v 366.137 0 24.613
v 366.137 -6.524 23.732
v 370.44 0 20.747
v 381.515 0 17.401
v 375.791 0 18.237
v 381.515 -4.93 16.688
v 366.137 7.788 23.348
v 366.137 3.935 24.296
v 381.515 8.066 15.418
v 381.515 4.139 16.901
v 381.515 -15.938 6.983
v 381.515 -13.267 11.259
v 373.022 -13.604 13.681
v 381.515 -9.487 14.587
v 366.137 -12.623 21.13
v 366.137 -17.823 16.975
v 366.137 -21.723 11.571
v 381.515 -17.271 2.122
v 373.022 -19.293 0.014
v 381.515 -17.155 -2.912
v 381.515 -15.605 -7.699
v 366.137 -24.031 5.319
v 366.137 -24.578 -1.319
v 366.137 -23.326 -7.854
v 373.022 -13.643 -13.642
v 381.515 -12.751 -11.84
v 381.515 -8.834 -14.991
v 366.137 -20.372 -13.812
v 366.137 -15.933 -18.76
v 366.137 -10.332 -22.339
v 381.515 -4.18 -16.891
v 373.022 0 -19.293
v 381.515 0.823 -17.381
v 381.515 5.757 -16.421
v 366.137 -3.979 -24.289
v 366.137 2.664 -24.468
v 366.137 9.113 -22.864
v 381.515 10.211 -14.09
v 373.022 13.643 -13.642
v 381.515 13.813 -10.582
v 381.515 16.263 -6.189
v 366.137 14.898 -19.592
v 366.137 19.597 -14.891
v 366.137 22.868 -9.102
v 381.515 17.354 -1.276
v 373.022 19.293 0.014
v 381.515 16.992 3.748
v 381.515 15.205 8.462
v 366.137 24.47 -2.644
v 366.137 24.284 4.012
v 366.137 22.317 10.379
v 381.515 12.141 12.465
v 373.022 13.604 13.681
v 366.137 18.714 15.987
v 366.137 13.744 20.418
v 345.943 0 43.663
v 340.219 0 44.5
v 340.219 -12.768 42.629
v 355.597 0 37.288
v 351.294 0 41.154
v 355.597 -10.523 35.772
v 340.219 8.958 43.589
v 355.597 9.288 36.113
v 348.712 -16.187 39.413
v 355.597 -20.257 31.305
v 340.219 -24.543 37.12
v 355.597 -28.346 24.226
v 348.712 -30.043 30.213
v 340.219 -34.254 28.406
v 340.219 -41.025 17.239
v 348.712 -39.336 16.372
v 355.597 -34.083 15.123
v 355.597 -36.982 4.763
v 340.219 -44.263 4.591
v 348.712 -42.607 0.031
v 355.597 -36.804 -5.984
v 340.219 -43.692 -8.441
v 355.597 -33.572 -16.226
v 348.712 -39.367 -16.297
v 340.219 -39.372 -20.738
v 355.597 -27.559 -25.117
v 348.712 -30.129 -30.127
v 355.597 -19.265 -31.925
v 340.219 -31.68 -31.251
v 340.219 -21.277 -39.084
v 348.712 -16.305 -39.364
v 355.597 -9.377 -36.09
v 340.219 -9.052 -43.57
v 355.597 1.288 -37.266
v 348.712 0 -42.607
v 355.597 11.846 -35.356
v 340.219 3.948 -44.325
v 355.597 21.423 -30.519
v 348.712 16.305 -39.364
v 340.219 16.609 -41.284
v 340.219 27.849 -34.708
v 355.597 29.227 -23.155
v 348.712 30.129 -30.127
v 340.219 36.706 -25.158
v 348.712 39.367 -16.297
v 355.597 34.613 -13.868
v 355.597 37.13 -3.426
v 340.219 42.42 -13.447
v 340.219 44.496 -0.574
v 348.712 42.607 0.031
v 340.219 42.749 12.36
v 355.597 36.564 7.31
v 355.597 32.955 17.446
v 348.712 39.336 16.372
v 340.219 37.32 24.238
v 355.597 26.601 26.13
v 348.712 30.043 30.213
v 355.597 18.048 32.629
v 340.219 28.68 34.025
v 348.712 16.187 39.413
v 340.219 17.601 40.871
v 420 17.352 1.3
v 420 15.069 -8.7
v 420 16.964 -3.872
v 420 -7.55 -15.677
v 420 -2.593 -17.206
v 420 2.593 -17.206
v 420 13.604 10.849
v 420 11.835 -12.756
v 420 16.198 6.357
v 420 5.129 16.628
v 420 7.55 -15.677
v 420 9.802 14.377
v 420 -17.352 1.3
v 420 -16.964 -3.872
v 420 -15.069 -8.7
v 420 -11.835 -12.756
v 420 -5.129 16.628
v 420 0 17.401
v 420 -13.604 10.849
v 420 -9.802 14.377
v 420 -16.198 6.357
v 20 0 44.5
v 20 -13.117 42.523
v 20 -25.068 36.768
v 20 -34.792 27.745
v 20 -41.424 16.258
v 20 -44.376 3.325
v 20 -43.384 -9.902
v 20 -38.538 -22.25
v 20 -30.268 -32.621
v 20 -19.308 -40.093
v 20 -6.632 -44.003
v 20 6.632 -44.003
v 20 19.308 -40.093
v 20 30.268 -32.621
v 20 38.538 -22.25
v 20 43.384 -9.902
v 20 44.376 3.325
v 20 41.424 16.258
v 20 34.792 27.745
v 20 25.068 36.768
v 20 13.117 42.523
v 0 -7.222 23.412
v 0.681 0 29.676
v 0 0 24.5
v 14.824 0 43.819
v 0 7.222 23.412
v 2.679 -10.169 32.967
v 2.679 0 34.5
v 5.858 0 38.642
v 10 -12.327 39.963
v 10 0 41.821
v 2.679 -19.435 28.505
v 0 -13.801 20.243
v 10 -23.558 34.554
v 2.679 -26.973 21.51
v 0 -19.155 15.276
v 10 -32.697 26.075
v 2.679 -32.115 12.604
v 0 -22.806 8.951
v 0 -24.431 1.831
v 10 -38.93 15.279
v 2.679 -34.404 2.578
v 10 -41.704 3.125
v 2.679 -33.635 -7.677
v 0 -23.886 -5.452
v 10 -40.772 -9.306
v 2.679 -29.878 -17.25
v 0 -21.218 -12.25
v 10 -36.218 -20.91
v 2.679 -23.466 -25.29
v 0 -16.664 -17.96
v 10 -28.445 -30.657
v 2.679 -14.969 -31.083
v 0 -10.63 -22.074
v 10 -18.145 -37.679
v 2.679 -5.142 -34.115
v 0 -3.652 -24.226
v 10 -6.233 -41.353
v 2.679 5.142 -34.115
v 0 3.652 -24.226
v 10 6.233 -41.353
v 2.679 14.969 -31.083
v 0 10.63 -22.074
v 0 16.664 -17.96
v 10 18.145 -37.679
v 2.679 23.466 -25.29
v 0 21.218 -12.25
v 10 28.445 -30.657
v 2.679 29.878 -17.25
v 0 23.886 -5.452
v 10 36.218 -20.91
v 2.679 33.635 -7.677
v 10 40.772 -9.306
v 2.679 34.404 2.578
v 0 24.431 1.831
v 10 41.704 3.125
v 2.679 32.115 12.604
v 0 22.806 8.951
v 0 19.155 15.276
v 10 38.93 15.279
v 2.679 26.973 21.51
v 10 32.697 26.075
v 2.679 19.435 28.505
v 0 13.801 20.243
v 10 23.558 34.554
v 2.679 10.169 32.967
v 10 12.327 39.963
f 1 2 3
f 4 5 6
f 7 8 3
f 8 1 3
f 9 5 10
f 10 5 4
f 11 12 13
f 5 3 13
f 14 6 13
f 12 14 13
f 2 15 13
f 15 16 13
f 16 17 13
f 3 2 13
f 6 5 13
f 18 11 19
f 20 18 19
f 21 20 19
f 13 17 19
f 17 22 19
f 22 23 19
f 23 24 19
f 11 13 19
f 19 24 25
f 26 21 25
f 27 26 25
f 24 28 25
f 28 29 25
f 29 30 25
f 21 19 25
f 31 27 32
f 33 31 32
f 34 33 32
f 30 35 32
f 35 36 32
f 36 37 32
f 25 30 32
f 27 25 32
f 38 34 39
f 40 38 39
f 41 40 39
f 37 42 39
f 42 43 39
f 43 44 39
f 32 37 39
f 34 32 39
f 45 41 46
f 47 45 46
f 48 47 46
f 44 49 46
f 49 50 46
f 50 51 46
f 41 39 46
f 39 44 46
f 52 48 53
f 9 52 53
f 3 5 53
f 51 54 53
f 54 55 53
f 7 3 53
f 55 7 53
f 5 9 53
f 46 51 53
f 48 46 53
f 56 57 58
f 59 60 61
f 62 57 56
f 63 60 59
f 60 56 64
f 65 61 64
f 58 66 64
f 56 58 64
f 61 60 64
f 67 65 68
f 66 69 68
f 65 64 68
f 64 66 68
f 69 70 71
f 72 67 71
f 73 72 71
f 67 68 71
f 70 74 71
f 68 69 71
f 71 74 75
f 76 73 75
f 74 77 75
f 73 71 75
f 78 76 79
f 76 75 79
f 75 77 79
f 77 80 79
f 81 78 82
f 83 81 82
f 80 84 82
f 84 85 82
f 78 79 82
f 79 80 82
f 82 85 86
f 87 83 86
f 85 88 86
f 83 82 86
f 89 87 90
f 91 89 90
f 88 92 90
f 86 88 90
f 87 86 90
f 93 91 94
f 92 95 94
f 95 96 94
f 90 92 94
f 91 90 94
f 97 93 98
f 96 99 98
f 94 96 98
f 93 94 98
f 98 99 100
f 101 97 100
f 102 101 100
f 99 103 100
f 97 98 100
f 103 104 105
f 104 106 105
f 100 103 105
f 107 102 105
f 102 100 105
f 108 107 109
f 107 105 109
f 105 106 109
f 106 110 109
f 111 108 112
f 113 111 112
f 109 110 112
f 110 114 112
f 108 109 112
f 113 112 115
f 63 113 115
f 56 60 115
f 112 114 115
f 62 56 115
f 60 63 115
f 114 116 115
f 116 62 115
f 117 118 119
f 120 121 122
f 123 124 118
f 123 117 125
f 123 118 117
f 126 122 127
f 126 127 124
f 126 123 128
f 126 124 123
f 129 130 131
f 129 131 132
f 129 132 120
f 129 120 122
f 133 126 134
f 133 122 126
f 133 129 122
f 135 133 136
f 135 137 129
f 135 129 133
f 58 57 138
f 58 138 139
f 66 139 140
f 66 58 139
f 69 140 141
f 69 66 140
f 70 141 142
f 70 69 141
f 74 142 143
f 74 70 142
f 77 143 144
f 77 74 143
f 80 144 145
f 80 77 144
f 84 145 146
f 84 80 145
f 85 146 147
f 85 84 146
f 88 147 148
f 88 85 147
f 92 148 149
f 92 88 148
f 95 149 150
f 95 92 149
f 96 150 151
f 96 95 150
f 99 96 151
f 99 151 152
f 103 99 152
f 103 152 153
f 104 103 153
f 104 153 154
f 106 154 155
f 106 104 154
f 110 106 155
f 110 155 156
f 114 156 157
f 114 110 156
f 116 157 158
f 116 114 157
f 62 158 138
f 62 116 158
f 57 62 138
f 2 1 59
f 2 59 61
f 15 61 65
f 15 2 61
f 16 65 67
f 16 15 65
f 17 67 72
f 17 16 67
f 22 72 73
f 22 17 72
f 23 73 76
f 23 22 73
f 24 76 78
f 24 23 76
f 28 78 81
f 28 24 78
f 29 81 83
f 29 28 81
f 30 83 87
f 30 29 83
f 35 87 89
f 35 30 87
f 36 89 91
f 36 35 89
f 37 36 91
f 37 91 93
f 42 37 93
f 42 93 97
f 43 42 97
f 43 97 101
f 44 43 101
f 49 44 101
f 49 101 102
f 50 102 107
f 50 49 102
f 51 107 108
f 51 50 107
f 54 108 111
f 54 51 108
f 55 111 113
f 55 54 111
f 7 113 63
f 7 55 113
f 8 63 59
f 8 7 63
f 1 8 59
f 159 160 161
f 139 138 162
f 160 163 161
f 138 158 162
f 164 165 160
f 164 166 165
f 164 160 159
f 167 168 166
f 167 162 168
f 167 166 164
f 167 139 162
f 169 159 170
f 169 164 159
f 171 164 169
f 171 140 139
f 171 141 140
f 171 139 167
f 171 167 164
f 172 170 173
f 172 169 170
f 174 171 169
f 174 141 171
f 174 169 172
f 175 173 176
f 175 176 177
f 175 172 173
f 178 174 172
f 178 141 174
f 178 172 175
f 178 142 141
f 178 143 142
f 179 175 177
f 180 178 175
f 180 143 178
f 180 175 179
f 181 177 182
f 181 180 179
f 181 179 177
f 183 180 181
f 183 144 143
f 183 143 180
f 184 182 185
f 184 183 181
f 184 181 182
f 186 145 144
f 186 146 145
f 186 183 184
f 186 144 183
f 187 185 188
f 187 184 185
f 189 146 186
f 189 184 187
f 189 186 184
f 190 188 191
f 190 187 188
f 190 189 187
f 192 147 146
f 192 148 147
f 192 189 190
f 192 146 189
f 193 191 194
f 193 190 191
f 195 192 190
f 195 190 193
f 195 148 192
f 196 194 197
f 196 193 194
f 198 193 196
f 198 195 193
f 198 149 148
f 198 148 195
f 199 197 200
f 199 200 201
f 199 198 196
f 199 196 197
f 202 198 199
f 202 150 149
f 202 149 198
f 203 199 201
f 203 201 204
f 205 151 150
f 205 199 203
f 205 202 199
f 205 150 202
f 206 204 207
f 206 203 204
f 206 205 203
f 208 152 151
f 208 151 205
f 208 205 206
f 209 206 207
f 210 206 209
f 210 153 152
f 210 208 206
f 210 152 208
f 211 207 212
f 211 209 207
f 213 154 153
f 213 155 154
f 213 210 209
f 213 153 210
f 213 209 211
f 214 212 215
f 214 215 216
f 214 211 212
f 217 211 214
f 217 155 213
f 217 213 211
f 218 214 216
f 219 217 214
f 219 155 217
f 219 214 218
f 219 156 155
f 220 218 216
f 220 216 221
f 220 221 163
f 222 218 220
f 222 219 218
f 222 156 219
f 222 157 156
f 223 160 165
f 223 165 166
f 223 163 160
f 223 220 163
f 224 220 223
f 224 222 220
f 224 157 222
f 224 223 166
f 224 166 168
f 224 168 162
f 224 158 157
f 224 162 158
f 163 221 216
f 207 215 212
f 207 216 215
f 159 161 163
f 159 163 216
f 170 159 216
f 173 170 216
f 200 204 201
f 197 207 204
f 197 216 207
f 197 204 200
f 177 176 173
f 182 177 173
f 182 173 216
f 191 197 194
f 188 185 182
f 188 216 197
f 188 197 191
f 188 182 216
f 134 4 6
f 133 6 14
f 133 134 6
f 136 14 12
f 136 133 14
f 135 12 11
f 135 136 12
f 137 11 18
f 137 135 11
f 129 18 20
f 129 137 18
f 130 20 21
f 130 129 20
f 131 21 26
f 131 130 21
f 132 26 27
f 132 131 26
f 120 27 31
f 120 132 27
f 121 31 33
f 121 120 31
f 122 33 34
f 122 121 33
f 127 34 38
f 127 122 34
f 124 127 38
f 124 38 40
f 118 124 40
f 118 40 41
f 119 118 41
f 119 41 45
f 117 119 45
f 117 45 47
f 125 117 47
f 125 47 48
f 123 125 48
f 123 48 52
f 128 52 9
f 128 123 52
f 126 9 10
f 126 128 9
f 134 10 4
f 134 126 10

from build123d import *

# Parameters (mm, degrees)
ZAOBLIT1_R = 20


with BuildPart() as part:
    # Skica1 → Rotovat1 (revolve)
    with BuildSketch(Plane.XY, mode=Mode.PRIVATE) as rotovat1_sk:
        Polygon((0, 0), (0, 44.5), (349.599506462, 44.5), (372.134762873, 17.400641026), (420, 17.400641026), (420, 0), align=None)
    revolve(rotovat1_sk.sketch.rotate(Axis((0, 0, 0), (1, 0, 0)), 90), axis=Axis((0, 0, 0), (1, 0, 0)))

    # Zaoblit1
    zaoblit1_edges = [part.edges().sort_by_distance(p)[0] for p in [
        (372.134762873, 0, -17.400641026),
        (349.599506462, 0, -44.5),
        (0, 0, -44.5),
    ]]
    fillet(zaoblit1_edges, radius=ZAOBLIT1_R)


solid = part.part
